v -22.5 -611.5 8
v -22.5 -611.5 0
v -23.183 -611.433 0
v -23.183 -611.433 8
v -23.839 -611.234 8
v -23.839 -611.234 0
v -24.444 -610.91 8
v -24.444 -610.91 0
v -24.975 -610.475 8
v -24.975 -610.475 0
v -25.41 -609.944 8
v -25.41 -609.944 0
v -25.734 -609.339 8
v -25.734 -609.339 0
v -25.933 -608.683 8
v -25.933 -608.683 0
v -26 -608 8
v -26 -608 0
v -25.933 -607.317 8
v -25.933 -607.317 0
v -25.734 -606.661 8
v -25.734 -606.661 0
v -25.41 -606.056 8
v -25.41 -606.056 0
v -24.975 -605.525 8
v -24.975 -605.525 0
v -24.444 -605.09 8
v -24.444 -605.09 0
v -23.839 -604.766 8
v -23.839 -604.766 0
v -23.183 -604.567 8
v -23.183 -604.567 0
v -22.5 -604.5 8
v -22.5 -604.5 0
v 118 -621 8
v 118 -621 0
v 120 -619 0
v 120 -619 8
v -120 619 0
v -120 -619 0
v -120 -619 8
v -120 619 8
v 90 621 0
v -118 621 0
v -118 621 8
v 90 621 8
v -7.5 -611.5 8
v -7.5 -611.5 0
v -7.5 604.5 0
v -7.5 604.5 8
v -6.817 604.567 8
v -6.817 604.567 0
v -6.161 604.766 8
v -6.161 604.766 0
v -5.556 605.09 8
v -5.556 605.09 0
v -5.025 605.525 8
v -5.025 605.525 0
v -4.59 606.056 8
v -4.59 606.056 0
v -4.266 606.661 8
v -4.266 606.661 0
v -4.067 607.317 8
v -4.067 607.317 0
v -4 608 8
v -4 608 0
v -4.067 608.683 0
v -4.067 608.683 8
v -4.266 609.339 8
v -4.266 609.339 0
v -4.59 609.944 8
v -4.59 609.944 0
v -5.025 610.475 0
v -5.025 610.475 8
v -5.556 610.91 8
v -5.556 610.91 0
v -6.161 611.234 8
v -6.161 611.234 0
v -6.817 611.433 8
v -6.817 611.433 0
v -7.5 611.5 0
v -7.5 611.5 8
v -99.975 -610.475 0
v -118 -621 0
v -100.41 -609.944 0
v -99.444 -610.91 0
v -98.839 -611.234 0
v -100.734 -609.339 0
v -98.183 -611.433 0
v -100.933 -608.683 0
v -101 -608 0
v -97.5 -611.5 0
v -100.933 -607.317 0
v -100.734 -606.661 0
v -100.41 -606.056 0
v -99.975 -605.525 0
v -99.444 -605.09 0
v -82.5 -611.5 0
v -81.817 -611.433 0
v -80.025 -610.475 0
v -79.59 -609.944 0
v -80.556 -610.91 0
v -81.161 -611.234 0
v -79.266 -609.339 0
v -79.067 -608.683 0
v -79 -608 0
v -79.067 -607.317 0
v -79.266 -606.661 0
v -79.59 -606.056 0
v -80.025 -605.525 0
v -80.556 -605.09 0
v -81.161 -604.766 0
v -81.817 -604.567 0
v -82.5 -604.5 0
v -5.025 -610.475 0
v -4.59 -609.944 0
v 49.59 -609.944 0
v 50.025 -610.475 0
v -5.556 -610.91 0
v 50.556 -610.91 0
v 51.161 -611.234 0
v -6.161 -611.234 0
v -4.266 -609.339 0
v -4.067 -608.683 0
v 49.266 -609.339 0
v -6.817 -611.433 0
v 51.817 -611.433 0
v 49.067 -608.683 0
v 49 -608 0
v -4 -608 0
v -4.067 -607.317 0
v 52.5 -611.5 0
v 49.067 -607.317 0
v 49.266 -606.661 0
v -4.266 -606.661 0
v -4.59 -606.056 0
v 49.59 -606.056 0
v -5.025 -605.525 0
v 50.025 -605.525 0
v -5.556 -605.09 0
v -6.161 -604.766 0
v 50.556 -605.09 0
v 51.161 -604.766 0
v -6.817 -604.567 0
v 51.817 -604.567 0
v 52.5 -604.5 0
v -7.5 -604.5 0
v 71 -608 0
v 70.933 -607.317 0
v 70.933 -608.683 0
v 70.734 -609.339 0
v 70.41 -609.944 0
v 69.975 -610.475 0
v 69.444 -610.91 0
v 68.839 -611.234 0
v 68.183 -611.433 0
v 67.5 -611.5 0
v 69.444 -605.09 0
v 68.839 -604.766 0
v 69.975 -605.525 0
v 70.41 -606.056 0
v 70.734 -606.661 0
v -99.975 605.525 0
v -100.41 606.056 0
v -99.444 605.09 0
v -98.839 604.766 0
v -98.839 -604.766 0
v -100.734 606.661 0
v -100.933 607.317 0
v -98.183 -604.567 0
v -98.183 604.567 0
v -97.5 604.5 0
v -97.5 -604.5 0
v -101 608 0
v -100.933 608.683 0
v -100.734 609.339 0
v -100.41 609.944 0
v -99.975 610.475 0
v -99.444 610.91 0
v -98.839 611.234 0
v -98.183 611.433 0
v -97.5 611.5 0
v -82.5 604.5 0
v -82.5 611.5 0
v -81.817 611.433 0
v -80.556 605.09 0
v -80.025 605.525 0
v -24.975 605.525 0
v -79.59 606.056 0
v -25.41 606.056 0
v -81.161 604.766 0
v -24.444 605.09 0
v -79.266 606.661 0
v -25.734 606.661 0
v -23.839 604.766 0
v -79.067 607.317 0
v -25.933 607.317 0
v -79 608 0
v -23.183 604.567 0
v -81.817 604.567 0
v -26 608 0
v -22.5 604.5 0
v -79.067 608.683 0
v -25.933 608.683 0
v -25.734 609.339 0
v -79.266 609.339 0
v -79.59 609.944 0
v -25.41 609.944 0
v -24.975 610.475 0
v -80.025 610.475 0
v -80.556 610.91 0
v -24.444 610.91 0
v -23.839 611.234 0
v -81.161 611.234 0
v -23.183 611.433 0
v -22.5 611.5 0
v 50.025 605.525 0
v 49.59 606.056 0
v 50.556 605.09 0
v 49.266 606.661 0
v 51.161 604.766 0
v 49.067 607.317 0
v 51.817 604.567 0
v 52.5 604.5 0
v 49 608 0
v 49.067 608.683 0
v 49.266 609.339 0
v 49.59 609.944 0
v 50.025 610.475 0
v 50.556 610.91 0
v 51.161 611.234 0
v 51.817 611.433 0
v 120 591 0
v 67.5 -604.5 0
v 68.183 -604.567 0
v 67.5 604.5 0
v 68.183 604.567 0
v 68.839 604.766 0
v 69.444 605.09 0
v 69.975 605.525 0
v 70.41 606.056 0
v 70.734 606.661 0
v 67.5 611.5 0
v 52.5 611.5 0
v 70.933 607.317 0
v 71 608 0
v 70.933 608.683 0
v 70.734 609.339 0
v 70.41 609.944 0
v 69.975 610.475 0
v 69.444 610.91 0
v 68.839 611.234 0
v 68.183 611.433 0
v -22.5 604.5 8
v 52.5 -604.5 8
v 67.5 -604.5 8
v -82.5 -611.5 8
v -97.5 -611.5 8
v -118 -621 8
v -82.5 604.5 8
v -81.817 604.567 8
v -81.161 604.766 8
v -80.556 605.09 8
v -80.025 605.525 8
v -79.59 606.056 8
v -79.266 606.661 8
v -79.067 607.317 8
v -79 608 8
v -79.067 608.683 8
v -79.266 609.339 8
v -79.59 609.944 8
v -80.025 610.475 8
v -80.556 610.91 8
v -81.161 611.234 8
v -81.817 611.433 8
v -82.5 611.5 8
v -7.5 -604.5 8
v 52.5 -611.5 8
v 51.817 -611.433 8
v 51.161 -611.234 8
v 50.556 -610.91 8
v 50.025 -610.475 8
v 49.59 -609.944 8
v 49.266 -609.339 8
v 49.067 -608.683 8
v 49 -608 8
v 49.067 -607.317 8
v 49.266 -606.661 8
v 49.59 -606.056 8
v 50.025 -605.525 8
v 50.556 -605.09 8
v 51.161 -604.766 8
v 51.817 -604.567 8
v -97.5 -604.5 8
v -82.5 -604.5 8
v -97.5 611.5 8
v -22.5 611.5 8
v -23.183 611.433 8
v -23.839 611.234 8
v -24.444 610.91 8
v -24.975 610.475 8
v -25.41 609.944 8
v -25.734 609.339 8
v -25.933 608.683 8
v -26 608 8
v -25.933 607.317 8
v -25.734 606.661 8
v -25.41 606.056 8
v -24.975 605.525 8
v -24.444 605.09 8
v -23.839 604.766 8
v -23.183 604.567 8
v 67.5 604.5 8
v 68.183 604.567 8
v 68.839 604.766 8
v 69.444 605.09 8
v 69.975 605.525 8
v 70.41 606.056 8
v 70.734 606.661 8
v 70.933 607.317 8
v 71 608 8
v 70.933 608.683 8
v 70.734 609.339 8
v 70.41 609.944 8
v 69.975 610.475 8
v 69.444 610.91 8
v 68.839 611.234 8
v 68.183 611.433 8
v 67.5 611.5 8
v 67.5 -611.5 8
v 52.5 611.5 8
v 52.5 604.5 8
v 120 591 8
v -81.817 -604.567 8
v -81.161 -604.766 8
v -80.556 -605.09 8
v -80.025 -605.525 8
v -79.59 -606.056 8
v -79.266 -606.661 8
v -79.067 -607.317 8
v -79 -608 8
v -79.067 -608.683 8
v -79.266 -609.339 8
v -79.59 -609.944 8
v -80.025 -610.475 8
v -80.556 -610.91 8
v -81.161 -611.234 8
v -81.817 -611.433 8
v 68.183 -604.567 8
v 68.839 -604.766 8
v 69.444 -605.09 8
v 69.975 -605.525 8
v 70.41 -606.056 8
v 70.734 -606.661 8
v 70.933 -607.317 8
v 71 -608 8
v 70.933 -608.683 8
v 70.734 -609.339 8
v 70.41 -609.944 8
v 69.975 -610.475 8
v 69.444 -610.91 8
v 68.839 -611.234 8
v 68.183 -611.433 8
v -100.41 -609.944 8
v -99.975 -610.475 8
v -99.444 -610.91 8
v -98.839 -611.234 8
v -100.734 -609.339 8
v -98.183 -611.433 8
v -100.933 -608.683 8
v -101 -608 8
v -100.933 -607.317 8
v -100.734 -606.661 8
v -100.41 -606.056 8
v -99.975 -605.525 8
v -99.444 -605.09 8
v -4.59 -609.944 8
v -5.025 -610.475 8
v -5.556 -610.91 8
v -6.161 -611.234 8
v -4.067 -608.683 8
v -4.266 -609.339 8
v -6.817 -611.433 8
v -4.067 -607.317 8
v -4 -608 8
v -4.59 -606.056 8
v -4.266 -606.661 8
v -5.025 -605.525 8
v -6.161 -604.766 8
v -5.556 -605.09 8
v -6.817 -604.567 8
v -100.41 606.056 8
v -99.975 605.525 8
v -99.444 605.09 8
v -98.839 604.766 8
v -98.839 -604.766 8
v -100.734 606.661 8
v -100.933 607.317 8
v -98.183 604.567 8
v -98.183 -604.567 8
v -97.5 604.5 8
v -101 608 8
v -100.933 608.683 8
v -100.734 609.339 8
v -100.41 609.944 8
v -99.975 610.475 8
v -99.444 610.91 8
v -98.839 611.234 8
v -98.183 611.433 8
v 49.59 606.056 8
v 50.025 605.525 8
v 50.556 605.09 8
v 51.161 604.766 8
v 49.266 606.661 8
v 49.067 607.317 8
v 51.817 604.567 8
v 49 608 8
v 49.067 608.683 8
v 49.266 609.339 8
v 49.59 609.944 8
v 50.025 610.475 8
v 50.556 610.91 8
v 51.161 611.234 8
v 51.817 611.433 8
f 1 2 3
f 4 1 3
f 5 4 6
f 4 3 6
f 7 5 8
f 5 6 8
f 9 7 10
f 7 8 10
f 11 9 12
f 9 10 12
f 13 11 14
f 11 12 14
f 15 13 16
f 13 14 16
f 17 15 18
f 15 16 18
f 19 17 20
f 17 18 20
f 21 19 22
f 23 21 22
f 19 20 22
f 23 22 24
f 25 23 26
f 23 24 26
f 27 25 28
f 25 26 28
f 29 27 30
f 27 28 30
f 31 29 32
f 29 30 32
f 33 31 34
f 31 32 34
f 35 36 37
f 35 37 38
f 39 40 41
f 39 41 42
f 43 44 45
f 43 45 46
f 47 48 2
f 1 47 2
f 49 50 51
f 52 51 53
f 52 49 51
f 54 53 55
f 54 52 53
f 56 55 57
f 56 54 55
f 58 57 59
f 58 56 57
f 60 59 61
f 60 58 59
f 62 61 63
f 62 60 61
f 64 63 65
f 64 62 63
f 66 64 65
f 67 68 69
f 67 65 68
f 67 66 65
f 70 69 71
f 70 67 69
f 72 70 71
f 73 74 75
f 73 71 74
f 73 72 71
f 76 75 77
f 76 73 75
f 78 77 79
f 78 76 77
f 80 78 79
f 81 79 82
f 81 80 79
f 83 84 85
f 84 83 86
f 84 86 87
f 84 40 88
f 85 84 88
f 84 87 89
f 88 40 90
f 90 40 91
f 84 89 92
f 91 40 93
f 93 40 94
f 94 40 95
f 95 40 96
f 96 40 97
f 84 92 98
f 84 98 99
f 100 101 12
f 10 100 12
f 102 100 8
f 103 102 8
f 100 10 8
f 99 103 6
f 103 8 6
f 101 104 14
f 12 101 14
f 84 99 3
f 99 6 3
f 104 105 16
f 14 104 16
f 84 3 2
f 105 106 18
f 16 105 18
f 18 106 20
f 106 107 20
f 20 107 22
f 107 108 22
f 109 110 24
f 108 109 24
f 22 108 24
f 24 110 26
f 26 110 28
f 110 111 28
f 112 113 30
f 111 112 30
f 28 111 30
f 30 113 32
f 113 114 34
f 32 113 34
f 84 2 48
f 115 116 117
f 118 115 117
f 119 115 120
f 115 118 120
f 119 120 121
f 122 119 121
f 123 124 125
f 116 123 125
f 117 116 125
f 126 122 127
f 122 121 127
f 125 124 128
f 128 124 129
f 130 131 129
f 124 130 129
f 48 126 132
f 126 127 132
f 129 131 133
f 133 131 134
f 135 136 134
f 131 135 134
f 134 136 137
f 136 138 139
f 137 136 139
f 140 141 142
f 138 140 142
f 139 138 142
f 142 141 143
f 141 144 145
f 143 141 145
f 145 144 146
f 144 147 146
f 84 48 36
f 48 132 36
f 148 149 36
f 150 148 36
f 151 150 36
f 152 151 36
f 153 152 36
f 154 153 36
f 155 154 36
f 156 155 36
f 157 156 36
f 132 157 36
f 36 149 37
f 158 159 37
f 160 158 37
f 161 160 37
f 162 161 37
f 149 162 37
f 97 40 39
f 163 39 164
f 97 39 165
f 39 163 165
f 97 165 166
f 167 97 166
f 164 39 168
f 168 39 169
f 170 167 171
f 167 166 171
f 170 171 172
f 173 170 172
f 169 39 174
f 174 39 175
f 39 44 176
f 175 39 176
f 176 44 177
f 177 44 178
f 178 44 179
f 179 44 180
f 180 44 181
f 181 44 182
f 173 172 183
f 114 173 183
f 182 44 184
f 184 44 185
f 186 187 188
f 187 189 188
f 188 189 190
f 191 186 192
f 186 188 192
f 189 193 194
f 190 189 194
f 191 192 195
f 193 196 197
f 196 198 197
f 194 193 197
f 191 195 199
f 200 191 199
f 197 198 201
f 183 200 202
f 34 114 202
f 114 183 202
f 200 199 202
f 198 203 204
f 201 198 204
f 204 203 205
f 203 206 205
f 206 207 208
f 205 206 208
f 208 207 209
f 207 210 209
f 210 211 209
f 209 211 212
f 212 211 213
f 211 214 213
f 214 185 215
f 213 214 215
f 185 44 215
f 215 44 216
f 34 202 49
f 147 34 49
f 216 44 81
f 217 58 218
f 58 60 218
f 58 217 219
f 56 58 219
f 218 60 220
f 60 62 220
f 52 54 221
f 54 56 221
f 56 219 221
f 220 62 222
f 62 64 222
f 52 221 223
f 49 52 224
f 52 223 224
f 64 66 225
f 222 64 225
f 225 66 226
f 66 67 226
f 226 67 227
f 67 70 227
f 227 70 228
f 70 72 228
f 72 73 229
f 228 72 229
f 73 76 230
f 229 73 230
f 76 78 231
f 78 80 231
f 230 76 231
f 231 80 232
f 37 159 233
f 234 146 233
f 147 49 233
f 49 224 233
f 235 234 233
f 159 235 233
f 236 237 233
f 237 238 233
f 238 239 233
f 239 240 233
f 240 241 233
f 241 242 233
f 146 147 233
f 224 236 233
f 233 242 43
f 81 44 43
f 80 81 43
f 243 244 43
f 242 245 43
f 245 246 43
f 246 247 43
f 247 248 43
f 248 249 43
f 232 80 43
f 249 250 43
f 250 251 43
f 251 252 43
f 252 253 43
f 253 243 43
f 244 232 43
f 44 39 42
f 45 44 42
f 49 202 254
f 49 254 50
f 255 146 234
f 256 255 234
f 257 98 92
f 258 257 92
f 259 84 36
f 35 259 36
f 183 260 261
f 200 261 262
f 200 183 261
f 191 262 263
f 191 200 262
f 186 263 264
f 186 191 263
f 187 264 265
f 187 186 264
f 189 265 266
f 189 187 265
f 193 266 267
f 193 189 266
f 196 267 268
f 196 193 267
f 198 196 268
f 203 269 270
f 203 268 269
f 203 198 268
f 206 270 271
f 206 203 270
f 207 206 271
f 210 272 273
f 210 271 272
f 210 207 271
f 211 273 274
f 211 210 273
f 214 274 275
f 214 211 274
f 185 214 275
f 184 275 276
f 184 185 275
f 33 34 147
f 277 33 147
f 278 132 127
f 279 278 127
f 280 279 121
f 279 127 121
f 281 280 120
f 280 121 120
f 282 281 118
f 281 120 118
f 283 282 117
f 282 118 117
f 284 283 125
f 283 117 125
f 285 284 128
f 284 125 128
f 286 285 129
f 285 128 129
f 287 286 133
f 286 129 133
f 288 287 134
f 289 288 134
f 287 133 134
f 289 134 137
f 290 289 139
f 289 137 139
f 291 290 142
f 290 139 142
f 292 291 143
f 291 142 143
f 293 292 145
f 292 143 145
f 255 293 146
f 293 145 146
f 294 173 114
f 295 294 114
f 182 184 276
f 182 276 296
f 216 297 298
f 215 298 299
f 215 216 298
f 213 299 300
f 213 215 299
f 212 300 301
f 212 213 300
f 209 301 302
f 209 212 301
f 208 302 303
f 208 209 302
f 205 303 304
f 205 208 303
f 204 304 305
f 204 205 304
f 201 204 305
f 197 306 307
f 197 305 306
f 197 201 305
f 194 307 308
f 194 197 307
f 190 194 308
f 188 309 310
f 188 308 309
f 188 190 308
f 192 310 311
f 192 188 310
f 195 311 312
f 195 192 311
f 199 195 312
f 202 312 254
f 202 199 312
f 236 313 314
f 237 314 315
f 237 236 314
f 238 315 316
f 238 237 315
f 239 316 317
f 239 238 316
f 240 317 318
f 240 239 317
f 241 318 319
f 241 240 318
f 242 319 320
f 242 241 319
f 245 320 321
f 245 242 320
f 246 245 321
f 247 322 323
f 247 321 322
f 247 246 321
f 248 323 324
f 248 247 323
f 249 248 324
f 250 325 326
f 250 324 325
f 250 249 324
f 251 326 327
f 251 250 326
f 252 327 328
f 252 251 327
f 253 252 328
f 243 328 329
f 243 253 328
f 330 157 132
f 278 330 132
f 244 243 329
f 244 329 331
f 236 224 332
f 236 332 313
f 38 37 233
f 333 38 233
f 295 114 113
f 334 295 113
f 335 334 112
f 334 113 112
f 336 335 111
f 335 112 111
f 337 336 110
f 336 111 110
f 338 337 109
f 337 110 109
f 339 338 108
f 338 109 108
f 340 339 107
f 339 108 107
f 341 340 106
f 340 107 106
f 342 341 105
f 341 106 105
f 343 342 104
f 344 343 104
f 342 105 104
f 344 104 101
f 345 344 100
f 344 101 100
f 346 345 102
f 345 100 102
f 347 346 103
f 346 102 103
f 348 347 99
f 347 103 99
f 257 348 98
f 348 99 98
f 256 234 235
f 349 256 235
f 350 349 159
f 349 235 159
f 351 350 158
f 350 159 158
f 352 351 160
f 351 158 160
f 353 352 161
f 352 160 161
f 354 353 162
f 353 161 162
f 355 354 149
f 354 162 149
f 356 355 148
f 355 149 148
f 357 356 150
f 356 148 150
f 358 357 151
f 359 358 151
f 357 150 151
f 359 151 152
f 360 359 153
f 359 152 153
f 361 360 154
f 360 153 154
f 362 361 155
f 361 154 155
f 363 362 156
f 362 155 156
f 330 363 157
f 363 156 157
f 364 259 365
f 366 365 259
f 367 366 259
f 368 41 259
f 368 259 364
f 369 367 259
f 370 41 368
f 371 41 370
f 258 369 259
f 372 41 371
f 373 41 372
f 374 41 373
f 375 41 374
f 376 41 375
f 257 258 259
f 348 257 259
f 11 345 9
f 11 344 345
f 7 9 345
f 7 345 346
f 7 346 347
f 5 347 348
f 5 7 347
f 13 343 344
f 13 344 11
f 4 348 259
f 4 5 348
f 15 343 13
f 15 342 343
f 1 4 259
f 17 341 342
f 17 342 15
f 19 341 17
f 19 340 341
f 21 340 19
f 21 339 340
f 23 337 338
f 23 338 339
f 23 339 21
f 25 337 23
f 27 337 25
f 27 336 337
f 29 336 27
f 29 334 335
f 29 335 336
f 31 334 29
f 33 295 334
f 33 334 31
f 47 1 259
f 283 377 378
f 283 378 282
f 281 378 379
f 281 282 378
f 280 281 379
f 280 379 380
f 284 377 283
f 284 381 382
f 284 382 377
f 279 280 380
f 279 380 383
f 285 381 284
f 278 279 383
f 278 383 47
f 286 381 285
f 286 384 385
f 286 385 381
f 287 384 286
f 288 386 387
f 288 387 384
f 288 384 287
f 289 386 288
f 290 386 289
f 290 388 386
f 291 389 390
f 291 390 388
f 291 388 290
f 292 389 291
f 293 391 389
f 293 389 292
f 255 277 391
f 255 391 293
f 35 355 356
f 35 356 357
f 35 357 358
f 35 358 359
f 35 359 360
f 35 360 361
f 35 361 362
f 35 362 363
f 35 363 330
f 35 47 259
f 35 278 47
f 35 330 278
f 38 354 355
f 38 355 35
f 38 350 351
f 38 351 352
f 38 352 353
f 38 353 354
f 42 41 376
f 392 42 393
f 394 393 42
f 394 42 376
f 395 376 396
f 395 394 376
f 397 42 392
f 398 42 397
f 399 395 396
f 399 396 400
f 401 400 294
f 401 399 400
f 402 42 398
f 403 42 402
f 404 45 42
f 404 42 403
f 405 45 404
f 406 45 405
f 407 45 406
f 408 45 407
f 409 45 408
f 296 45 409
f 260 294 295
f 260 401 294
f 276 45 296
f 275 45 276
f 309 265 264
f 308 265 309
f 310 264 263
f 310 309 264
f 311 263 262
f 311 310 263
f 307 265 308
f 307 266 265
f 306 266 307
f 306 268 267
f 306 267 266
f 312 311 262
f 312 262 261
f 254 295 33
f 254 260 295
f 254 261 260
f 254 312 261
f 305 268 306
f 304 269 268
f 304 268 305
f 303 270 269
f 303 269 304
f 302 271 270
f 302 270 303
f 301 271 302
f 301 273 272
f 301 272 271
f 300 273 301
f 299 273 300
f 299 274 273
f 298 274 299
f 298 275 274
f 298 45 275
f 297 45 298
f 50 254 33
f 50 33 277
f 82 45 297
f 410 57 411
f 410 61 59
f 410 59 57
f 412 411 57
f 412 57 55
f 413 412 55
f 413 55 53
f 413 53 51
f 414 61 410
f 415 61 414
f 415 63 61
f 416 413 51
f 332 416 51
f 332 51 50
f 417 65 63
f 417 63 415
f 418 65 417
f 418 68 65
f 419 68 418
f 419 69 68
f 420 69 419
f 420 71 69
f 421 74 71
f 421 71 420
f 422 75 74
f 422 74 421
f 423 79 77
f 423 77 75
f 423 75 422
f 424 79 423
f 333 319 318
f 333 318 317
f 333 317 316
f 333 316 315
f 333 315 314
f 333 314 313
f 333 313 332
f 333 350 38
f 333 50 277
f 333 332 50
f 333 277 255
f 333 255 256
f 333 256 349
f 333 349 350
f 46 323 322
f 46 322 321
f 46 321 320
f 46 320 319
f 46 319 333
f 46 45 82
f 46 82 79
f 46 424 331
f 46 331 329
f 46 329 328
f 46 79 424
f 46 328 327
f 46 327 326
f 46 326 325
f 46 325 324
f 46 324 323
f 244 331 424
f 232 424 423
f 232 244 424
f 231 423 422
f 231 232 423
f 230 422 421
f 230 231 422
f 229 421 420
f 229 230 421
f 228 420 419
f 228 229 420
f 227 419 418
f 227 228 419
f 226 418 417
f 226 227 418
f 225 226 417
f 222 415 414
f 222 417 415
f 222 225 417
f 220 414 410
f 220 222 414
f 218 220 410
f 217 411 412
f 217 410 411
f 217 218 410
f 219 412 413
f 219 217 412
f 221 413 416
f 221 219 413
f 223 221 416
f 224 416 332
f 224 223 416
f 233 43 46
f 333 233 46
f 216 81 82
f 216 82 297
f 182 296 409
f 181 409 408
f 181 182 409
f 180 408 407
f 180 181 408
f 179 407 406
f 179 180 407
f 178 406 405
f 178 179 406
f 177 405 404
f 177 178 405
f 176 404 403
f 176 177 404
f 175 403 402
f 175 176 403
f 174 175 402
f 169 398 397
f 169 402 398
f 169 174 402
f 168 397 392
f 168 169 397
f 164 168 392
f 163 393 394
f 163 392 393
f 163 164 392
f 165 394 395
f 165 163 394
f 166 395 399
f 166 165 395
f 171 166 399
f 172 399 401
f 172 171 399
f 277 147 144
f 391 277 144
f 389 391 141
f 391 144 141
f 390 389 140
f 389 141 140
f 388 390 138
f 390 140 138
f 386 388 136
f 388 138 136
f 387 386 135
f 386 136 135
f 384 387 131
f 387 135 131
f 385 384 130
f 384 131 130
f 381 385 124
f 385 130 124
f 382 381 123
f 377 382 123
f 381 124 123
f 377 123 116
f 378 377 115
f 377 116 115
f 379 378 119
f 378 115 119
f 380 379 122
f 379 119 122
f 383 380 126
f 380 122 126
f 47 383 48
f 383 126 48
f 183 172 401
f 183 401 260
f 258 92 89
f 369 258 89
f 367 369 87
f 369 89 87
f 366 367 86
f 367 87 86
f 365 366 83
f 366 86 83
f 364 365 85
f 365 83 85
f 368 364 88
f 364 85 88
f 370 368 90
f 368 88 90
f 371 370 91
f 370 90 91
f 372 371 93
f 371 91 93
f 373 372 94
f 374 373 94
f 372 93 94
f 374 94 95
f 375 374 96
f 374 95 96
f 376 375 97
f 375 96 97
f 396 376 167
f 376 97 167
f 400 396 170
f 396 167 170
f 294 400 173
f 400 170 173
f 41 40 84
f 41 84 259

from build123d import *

# Parameters (mm, degrees)
SKETCH_1_W          = 240
SKETCH_1_H          = 1242
EXTRUDE_1_DEPTH     = 8
CHAMFER_1_SIZE      = 30
CHAMFER_2_SIZE      = 2
CUT_EXTRUDE_1_DEPTH = 10


with BuildPart() as part:
    # 草图1 → 凸台-拉伸1 (new body)
    with BuildSketch(Plane.XY):
        Rectangle(SKETCH_1_W, SKETCH_1_H)
    extrude(amount=EXTRUDE_1_DEPTH)

    # 倒角1
    chamfer_1_edges = [part.edges().sort_by_distance(p)[0] for p in [
        (120, 621, 4),
    ]]
    chamfer(chamfer_1_edges, length=CHAMFER_1_SIZE)

    # 倒角2
    chamfer_2_edges = [part.edges().sort_by_distance(p)[0] for p in [
        (120, -621, 4),
        (-120, -621, 4),
        (-120, 621, 4),
    ]]
    chamfer(chamfer_2_edges, length=CHAMFER_2_SIZE)

    # 草图2 → 切除-拉伸1 (cut)
    with BuildSketch(Plane(origin=(0, 0, 0), x_dir=(-1, 0, 0), z_dir=(0, 0, -1))):
        with BuildLine():
            Line((-67.5, 611.5), (-52.5, 611.5))
            ThreePointArc((-52.5, 611.5), (-49, 608), (-52.5, 604.5))
            Line((-52.5, 604.5), (-67.5, 604.5))
            ThreePointArc((-67.5, 604.5), (-71, 608), (-67.5, 611.5))
        make_face()
        with BuildLine():
            Line((7.5, 611.5), (22.5, 611.5))
            ThreePointArc((22.5, 611.5), (26, 608), (22.5, 604.5))
            Line((22.5, 604.5), (7.5, 604.5))
            ThreePointArc((7.5, 604.5), (4, 608), (7.5, 611.5))
        make_face()
        with BuildLine():
            Line((82.5, 611.5), (97.5, 611.5))
            ThreePointArc((97.5, 611.5), (101, 608), (97.5, 604.5))
            Line((97.5, 604.5), (82.5, 604.5))
            ThreePointArc((82.5, 604.5), (79, 608), (82.5, 611.5))
        make_face()
        with BuildLine():
            Line((-67.5, -611.5), (-52.5, -611.5))
            ThreePointArc((-52.5, -611.5), (-49, -608), (-52.5, -604.5))
            Line((-52.5, -604.5), (-67.5, -604.5))
            ThreePointArc((-67.5, -604.5), (-71, -608), (-67.5, -611.5))
        make_face()
        with BuildLine():
            Line((7.5, -611.5), (22.5, -611.5))
            ThreePointArc((22.5, -611.5), (26, -608), (22.5, -604.5))
            Line((22.5, -604.5), (7.5, -604.5))
            ThreePointArc((7.5, -604.5), (4, -608), (7.5, -611.5))
        make_face()
        with BuildLine():
            Line((82.5, -611.5), (97.5, -611.5))
            ThreePointArc((97.5, -611.5), (101, -608), (97.5, -604.5))
            Line((97.5, -604.5), (82.5, -604.5))
            ThreePointArc((82.5, -604.5), (79, -608), (82.5, -611.5))
        make_face()
    extrude(amount=-CUT_EXTRUDE_1_DEPTH, mode=Mode.SUBTRACT)


solid = part.part
